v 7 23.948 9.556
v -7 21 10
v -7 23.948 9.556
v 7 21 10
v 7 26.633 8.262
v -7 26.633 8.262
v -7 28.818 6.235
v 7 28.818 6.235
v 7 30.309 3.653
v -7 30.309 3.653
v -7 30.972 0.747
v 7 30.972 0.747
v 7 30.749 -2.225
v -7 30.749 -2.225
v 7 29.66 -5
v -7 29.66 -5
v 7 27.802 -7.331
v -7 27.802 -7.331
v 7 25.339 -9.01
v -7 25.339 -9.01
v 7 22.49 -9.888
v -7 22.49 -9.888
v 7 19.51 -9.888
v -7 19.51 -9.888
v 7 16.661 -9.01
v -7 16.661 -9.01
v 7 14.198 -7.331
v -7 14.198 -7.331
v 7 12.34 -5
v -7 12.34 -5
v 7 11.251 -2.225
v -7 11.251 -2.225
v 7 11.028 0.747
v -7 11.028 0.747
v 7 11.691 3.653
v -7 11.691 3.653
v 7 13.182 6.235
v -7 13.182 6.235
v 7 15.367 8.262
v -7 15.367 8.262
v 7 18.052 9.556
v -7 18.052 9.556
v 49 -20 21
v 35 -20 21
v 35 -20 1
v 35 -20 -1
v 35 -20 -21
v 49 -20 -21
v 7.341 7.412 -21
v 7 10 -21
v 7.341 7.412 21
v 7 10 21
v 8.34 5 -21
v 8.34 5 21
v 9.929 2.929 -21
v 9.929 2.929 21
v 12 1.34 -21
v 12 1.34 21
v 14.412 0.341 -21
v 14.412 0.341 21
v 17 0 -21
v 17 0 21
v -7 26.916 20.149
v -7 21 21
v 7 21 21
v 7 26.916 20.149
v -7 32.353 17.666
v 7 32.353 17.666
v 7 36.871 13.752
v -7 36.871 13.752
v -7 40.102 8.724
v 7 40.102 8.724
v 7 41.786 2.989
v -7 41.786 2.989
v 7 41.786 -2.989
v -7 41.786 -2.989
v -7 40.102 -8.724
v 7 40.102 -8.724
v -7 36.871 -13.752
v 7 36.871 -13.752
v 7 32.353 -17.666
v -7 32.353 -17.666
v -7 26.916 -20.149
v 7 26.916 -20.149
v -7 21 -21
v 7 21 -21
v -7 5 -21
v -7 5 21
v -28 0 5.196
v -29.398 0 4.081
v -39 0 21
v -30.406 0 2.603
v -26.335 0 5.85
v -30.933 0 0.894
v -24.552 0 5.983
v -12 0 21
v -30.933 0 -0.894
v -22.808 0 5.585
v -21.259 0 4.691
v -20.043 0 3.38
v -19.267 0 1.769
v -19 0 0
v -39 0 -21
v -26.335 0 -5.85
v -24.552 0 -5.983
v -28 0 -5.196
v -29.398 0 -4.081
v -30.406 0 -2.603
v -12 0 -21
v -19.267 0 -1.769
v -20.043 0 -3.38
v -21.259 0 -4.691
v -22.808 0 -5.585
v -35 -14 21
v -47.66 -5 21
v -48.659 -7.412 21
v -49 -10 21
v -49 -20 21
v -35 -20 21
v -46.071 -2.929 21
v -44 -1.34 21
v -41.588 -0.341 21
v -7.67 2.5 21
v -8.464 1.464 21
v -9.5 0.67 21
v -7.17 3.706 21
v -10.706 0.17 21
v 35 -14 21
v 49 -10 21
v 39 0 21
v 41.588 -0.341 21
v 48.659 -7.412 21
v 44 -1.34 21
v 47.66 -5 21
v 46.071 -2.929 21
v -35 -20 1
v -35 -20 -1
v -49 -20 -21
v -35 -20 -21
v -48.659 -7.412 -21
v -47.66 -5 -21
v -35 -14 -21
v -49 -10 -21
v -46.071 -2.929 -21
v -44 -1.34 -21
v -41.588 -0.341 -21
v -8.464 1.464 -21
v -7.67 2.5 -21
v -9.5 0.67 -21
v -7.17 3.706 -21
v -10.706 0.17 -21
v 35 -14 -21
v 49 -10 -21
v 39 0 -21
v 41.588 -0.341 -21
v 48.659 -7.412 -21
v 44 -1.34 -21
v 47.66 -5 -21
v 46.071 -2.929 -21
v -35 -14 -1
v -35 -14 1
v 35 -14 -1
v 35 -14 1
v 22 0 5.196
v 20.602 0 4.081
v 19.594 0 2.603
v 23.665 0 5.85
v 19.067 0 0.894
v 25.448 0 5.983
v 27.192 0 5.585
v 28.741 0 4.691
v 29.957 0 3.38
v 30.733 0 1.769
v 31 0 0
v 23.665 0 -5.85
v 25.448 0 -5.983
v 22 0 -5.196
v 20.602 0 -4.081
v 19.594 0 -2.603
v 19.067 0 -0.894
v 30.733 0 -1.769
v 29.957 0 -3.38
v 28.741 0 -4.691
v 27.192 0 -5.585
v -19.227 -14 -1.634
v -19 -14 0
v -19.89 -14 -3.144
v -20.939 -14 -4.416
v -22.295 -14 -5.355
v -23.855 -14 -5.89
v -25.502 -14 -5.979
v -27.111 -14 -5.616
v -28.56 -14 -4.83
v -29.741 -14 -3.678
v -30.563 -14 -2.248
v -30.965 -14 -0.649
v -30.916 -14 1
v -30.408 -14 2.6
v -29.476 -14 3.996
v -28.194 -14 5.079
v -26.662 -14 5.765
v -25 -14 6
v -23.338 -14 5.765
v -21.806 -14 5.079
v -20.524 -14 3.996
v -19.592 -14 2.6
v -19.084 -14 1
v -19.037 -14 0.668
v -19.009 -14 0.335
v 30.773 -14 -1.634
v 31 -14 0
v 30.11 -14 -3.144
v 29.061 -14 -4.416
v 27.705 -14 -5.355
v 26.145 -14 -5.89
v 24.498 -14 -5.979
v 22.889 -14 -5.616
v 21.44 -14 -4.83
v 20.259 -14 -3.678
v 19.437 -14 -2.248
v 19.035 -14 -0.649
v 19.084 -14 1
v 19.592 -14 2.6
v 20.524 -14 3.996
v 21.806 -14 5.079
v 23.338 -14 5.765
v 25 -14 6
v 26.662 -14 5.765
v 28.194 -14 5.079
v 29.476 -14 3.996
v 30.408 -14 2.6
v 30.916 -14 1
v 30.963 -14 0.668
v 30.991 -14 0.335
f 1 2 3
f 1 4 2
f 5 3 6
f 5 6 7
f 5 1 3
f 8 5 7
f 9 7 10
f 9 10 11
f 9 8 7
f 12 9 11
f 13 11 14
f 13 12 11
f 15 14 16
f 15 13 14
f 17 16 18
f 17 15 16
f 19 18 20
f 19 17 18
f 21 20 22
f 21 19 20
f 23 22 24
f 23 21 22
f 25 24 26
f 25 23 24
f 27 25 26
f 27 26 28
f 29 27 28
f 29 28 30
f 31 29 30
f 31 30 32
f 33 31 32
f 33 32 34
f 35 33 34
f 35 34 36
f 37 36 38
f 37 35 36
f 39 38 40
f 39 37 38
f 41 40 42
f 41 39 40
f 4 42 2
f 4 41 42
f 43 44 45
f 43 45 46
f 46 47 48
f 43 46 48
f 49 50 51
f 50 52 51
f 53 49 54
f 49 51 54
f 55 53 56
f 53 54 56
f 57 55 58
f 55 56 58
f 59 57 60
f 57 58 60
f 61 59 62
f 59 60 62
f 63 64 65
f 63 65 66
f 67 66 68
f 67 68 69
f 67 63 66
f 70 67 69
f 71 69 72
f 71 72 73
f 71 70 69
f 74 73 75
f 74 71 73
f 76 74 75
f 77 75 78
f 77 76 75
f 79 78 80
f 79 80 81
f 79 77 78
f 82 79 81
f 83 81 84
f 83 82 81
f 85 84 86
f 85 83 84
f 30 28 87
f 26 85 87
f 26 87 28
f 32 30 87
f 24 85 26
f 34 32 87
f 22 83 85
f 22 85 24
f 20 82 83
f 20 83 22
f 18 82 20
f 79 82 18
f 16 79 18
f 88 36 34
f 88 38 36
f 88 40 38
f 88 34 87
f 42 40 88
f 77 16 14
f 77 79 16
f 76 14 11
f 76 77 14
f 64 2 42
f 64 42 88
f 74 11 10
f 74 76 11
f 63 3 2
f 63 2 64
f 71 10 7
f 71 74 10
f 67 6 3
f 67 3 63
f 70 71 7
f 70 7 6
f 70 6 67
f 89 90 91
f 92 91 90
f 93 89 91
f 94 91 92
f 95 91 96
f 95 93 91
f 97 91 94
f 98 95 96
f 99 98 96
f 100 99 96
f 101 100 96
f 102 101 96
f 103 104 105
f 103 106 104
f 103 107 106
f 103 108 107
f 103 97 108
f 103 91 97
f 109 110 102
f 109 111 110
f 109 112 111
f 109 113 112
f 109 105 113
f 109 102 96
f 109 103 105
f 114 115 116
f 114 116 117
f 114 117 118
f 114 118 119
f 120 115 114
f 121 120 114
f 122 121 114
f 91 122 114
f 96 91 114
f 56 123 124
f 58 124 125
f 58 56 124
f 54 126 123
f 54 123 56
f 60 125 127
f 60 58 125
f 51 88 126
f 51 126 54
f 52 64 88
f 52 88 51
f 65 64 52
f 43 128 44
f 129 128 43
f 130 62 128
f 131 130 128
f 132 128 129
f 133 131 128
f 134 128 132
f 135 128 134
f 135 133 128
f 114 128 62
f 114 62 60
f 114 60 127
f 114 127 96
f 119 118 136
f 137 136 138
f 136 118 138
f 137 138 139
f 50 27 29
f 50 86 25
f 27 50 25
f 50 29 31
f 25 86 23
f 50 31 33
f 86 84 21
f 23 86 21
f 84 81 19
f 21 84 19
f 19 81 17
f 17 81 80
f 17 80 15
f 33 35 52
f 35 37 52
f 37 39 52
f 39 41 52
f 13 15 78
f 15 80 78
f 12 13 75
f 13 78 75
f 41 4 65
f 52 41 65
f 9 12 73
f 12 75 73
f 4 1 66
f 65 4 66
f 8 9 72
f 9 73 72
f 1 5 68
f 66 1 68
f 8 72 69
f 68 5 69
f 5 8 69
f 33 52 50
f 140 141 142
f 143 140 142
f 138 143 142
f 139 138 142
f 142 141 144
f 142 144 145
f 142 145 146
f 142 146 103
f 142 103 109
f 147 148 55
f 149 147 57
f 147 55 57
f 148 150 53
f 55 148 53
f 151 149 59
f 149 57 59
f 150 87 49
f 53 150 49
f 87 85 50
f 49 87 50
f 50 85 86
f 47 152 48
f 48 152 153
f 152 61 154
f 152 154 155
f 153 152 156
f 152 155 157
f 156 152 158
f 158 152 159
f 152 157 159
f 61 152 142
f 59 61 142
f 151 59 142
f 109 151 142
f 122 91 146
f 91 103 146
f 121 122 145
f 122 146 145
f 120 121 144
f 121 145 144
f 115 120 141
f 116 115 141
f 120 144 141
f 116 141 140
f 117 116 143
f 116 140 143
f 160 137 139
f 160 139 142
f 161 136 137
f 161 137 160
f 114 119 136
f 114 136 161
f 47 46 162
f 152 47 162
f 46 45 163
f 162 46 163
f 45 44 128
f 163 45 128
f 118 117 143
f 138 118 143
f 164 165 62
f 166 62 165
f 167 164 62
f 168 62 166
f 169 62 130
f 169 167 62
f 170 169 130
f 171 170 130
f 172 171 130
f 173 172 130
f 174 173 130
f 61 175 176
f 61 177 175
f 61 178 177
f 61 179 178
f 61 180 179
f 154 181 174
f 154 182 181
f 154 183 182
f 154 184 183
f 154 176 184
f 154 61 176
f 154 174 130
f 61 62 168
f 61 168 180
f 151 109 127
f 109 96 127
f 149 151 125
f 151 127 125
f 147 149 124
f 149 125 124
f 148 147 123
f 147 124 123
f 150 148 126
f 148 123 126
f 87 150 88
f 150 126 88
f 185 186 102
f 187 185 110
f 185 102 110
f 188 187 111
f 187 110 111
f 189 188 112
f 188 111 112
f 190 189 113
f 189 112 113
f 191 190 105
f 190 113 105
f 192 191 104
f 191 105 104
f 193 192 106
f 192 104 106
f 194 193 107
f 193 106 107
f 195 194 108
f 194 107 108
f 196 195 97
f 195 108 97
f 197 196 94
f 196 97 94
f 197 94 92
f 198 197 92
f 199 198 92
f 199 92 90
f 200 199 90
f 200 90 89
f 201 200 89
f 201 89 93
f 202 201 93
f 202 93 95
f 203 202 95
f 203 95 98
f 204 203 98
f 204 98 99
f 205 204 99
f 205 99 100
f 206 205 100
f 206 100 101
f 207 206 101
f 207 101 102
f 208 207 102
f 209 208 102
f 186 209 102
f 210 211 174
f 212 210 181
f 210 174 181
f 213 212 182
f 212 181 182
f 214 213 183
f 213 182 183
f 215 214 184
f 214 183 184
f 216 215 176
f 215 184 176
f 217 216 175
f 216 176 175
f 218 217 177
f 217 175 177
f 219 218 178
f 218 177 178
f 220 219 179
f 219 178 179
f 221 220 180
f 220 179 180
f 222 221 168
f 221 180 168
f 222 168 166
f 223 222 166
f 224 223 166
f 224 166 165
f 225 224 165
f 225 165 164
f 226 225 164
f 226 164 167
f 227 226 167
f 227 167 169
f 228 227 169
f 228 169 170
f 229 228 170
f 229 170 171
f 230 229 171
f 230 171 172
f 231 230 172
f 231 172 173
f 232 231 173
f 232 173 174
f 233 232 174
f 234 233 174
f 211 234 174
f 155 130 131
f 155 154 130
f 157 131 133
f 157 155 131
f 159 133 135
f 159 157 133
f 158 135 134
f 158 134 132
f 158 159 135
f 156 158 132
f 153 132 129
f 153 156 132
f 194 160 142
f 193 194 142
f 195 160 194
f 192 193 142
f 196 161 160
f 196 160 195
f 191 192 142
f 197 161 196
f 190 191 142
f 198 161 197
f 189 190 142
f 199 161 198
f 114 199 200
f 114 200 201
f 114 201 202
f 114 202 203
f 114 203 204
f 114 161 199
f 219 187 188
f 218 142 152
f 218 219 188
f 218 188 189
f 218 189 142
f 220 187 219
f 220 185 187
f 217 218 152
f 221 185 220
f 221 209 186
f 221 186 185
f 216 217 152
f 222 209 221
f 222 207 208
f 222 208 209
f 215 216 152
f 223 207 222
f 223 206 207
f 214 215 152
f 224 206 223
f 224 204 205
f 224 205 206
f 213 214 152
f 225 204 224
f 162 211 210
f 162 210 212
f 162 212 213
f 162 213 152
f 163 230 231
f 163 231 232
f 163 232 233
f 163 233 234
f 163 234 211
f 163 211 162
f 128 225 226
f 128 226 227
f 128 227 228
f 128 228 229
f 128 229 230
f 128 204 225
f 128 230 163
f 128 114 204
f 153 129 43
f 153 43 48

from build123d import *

# Parameters (mm, degrees)
SKETCH2_W           = 98
SKETCH2_H           = 42
SKETCH2_R           = 6
BOSS_EXTRUDE1_DEPTH = 20
SKETCH3_W           = 70
SKETCH3_H           = 6
CUT_EXTRUDE2_DEPTH  = 20
SKETCH4_W           = 70
SKETCH4_H           = 6
CUT_EXTRUDE3_DEPTH  = 20
SKETCH5_W           = 4.083920217
SKETCH5_H           = 6
CUT_EXTRUDE4_DEPTH  = 20
SKETCH6_W           = 4.083920217
SKETCH6_H           = 6
CUT_EXTRUDE5_DEPTH  = 20
SKETCH7_W           = 38.167840434
SKETCH7_H           = 6
CUT_EXTRUDE6_DEPTH  = 20
SKETCH8_R           = 10
BOSS_EXTRUDE2_DEPTH = 7
FILLET2_R           = 5
FILLET3_R           = 10


with BuildPart() as part:
    # Sketch2 → Boss-Extrude1 (new body)
    with BuildSketch(Plane(origin=(0, 0, 0), x_dir=(1, 0, 0), z_dir=(0, 1, 0))):
        Rectangle(SKETCH2_W, SKETCH2_H)
        with Locations((25, 0)):
            Circle(SKETCH2_R, mode=Mode.SUBTRACT)
        with Locations((-25, 0)):
            Circle(SKETCH2_R, mode=Mode.SUBTRACT)
    extrude(amount=-BOSS_EXTRUDE1_DEPTH)

    # Sketch3 → Cut-Extrude2 (cut)
    with BuildSketch(Plane.XY.offset(21)):
        with Locations((0, -17)):
            Rectangle(SKETCH3_W, SKETCH3_H)
    extrude(amount=-CUT_EXTRUDE2_DEPTH, mode=Mode.SUBTRACT)

    # Sketch4 → Cut-Extrude3 (cut)
    with BuildSketch(Plane(origin=(0, 0, -21), x_dir=(-1, 0, 0), z_dir=(0, 0, -1))):
        with Locations((0, -17)):
            Rectangle(SKETCH4_W, SKETCH4_H)
    extrude(amount=-CUT_EXTRUDE3_DEPTH, mode=Mode.SUBTRACT)

    # Sketch5 → Cut-Extrude4 (cut)
    with BuildSketch(Plane.XY.offset(1)):
        with Locations((32.958039892, -17)):
            Rectangle(SKETCH5_W, SKETCH5_H)
    extrude(amount=-CUT_EXTRUDE4_DEPTH, mode=Mode.SUBTRACT)

    # Sketch6 → Cut-Extrude5 (cut)
    with BuildSketch(Plane.XY.offset(1)):
        with Locations((-32.958039892, -17)):
            Rectangle(SKETCH6_W, SKETCH6_H)
    extrude(amount=-CUT_EXTRUDE5_DEPTH, mode=Mode.SUBTRACT)

    # Sketch7 → Cut-Extrude6 (cut)
    with BuildSketch(Plane.XY.offset(1)):
        with Locations((0, -17)):
            Rectangle(SKETCH7_W, SKETCH7_H)
    extrude(amount=-CUT_EXTRUDE6_DEPTH, mode=Mode.SUBTRACT)

    # Sketch8 → Boss-Extrude2 (add, symmetric)
    with BuildSketch(Plane.ZY):
        with BuildLine():
            Line((-21, 0), (21, 0))
            Line((21, 0), (21, 21))
            ThreePointArc((21, 21), (0, 42), (-21, 21))
            Line((-21, 21), (-21, 0))
        make_face()
        with Locations((0, 21)):
            Circle(SKETCH8_R, mode=Mode.SUBTRACT)
    extrude(amount=BOSS_EXTRUDE2_DEPTH, both=True)

    # Fillet2
    fillet2_edges = [part.edges().sort_by_distance(p)[0] for p in [
        (-7, 0, 0),
    ]]
    fillet(fillet2_edges, radius=FILLET2_R)

    # Fillet3
    fillet3_edges = [part.edges().sort_by_distance(p)[0] for p in [
        (7, 0, 0),
        (-49, 0, 0),
        (49, 0, 0),
    ]]
    fillet(fillet3_edges, radius=FILLET3_R)


solid = part.part
